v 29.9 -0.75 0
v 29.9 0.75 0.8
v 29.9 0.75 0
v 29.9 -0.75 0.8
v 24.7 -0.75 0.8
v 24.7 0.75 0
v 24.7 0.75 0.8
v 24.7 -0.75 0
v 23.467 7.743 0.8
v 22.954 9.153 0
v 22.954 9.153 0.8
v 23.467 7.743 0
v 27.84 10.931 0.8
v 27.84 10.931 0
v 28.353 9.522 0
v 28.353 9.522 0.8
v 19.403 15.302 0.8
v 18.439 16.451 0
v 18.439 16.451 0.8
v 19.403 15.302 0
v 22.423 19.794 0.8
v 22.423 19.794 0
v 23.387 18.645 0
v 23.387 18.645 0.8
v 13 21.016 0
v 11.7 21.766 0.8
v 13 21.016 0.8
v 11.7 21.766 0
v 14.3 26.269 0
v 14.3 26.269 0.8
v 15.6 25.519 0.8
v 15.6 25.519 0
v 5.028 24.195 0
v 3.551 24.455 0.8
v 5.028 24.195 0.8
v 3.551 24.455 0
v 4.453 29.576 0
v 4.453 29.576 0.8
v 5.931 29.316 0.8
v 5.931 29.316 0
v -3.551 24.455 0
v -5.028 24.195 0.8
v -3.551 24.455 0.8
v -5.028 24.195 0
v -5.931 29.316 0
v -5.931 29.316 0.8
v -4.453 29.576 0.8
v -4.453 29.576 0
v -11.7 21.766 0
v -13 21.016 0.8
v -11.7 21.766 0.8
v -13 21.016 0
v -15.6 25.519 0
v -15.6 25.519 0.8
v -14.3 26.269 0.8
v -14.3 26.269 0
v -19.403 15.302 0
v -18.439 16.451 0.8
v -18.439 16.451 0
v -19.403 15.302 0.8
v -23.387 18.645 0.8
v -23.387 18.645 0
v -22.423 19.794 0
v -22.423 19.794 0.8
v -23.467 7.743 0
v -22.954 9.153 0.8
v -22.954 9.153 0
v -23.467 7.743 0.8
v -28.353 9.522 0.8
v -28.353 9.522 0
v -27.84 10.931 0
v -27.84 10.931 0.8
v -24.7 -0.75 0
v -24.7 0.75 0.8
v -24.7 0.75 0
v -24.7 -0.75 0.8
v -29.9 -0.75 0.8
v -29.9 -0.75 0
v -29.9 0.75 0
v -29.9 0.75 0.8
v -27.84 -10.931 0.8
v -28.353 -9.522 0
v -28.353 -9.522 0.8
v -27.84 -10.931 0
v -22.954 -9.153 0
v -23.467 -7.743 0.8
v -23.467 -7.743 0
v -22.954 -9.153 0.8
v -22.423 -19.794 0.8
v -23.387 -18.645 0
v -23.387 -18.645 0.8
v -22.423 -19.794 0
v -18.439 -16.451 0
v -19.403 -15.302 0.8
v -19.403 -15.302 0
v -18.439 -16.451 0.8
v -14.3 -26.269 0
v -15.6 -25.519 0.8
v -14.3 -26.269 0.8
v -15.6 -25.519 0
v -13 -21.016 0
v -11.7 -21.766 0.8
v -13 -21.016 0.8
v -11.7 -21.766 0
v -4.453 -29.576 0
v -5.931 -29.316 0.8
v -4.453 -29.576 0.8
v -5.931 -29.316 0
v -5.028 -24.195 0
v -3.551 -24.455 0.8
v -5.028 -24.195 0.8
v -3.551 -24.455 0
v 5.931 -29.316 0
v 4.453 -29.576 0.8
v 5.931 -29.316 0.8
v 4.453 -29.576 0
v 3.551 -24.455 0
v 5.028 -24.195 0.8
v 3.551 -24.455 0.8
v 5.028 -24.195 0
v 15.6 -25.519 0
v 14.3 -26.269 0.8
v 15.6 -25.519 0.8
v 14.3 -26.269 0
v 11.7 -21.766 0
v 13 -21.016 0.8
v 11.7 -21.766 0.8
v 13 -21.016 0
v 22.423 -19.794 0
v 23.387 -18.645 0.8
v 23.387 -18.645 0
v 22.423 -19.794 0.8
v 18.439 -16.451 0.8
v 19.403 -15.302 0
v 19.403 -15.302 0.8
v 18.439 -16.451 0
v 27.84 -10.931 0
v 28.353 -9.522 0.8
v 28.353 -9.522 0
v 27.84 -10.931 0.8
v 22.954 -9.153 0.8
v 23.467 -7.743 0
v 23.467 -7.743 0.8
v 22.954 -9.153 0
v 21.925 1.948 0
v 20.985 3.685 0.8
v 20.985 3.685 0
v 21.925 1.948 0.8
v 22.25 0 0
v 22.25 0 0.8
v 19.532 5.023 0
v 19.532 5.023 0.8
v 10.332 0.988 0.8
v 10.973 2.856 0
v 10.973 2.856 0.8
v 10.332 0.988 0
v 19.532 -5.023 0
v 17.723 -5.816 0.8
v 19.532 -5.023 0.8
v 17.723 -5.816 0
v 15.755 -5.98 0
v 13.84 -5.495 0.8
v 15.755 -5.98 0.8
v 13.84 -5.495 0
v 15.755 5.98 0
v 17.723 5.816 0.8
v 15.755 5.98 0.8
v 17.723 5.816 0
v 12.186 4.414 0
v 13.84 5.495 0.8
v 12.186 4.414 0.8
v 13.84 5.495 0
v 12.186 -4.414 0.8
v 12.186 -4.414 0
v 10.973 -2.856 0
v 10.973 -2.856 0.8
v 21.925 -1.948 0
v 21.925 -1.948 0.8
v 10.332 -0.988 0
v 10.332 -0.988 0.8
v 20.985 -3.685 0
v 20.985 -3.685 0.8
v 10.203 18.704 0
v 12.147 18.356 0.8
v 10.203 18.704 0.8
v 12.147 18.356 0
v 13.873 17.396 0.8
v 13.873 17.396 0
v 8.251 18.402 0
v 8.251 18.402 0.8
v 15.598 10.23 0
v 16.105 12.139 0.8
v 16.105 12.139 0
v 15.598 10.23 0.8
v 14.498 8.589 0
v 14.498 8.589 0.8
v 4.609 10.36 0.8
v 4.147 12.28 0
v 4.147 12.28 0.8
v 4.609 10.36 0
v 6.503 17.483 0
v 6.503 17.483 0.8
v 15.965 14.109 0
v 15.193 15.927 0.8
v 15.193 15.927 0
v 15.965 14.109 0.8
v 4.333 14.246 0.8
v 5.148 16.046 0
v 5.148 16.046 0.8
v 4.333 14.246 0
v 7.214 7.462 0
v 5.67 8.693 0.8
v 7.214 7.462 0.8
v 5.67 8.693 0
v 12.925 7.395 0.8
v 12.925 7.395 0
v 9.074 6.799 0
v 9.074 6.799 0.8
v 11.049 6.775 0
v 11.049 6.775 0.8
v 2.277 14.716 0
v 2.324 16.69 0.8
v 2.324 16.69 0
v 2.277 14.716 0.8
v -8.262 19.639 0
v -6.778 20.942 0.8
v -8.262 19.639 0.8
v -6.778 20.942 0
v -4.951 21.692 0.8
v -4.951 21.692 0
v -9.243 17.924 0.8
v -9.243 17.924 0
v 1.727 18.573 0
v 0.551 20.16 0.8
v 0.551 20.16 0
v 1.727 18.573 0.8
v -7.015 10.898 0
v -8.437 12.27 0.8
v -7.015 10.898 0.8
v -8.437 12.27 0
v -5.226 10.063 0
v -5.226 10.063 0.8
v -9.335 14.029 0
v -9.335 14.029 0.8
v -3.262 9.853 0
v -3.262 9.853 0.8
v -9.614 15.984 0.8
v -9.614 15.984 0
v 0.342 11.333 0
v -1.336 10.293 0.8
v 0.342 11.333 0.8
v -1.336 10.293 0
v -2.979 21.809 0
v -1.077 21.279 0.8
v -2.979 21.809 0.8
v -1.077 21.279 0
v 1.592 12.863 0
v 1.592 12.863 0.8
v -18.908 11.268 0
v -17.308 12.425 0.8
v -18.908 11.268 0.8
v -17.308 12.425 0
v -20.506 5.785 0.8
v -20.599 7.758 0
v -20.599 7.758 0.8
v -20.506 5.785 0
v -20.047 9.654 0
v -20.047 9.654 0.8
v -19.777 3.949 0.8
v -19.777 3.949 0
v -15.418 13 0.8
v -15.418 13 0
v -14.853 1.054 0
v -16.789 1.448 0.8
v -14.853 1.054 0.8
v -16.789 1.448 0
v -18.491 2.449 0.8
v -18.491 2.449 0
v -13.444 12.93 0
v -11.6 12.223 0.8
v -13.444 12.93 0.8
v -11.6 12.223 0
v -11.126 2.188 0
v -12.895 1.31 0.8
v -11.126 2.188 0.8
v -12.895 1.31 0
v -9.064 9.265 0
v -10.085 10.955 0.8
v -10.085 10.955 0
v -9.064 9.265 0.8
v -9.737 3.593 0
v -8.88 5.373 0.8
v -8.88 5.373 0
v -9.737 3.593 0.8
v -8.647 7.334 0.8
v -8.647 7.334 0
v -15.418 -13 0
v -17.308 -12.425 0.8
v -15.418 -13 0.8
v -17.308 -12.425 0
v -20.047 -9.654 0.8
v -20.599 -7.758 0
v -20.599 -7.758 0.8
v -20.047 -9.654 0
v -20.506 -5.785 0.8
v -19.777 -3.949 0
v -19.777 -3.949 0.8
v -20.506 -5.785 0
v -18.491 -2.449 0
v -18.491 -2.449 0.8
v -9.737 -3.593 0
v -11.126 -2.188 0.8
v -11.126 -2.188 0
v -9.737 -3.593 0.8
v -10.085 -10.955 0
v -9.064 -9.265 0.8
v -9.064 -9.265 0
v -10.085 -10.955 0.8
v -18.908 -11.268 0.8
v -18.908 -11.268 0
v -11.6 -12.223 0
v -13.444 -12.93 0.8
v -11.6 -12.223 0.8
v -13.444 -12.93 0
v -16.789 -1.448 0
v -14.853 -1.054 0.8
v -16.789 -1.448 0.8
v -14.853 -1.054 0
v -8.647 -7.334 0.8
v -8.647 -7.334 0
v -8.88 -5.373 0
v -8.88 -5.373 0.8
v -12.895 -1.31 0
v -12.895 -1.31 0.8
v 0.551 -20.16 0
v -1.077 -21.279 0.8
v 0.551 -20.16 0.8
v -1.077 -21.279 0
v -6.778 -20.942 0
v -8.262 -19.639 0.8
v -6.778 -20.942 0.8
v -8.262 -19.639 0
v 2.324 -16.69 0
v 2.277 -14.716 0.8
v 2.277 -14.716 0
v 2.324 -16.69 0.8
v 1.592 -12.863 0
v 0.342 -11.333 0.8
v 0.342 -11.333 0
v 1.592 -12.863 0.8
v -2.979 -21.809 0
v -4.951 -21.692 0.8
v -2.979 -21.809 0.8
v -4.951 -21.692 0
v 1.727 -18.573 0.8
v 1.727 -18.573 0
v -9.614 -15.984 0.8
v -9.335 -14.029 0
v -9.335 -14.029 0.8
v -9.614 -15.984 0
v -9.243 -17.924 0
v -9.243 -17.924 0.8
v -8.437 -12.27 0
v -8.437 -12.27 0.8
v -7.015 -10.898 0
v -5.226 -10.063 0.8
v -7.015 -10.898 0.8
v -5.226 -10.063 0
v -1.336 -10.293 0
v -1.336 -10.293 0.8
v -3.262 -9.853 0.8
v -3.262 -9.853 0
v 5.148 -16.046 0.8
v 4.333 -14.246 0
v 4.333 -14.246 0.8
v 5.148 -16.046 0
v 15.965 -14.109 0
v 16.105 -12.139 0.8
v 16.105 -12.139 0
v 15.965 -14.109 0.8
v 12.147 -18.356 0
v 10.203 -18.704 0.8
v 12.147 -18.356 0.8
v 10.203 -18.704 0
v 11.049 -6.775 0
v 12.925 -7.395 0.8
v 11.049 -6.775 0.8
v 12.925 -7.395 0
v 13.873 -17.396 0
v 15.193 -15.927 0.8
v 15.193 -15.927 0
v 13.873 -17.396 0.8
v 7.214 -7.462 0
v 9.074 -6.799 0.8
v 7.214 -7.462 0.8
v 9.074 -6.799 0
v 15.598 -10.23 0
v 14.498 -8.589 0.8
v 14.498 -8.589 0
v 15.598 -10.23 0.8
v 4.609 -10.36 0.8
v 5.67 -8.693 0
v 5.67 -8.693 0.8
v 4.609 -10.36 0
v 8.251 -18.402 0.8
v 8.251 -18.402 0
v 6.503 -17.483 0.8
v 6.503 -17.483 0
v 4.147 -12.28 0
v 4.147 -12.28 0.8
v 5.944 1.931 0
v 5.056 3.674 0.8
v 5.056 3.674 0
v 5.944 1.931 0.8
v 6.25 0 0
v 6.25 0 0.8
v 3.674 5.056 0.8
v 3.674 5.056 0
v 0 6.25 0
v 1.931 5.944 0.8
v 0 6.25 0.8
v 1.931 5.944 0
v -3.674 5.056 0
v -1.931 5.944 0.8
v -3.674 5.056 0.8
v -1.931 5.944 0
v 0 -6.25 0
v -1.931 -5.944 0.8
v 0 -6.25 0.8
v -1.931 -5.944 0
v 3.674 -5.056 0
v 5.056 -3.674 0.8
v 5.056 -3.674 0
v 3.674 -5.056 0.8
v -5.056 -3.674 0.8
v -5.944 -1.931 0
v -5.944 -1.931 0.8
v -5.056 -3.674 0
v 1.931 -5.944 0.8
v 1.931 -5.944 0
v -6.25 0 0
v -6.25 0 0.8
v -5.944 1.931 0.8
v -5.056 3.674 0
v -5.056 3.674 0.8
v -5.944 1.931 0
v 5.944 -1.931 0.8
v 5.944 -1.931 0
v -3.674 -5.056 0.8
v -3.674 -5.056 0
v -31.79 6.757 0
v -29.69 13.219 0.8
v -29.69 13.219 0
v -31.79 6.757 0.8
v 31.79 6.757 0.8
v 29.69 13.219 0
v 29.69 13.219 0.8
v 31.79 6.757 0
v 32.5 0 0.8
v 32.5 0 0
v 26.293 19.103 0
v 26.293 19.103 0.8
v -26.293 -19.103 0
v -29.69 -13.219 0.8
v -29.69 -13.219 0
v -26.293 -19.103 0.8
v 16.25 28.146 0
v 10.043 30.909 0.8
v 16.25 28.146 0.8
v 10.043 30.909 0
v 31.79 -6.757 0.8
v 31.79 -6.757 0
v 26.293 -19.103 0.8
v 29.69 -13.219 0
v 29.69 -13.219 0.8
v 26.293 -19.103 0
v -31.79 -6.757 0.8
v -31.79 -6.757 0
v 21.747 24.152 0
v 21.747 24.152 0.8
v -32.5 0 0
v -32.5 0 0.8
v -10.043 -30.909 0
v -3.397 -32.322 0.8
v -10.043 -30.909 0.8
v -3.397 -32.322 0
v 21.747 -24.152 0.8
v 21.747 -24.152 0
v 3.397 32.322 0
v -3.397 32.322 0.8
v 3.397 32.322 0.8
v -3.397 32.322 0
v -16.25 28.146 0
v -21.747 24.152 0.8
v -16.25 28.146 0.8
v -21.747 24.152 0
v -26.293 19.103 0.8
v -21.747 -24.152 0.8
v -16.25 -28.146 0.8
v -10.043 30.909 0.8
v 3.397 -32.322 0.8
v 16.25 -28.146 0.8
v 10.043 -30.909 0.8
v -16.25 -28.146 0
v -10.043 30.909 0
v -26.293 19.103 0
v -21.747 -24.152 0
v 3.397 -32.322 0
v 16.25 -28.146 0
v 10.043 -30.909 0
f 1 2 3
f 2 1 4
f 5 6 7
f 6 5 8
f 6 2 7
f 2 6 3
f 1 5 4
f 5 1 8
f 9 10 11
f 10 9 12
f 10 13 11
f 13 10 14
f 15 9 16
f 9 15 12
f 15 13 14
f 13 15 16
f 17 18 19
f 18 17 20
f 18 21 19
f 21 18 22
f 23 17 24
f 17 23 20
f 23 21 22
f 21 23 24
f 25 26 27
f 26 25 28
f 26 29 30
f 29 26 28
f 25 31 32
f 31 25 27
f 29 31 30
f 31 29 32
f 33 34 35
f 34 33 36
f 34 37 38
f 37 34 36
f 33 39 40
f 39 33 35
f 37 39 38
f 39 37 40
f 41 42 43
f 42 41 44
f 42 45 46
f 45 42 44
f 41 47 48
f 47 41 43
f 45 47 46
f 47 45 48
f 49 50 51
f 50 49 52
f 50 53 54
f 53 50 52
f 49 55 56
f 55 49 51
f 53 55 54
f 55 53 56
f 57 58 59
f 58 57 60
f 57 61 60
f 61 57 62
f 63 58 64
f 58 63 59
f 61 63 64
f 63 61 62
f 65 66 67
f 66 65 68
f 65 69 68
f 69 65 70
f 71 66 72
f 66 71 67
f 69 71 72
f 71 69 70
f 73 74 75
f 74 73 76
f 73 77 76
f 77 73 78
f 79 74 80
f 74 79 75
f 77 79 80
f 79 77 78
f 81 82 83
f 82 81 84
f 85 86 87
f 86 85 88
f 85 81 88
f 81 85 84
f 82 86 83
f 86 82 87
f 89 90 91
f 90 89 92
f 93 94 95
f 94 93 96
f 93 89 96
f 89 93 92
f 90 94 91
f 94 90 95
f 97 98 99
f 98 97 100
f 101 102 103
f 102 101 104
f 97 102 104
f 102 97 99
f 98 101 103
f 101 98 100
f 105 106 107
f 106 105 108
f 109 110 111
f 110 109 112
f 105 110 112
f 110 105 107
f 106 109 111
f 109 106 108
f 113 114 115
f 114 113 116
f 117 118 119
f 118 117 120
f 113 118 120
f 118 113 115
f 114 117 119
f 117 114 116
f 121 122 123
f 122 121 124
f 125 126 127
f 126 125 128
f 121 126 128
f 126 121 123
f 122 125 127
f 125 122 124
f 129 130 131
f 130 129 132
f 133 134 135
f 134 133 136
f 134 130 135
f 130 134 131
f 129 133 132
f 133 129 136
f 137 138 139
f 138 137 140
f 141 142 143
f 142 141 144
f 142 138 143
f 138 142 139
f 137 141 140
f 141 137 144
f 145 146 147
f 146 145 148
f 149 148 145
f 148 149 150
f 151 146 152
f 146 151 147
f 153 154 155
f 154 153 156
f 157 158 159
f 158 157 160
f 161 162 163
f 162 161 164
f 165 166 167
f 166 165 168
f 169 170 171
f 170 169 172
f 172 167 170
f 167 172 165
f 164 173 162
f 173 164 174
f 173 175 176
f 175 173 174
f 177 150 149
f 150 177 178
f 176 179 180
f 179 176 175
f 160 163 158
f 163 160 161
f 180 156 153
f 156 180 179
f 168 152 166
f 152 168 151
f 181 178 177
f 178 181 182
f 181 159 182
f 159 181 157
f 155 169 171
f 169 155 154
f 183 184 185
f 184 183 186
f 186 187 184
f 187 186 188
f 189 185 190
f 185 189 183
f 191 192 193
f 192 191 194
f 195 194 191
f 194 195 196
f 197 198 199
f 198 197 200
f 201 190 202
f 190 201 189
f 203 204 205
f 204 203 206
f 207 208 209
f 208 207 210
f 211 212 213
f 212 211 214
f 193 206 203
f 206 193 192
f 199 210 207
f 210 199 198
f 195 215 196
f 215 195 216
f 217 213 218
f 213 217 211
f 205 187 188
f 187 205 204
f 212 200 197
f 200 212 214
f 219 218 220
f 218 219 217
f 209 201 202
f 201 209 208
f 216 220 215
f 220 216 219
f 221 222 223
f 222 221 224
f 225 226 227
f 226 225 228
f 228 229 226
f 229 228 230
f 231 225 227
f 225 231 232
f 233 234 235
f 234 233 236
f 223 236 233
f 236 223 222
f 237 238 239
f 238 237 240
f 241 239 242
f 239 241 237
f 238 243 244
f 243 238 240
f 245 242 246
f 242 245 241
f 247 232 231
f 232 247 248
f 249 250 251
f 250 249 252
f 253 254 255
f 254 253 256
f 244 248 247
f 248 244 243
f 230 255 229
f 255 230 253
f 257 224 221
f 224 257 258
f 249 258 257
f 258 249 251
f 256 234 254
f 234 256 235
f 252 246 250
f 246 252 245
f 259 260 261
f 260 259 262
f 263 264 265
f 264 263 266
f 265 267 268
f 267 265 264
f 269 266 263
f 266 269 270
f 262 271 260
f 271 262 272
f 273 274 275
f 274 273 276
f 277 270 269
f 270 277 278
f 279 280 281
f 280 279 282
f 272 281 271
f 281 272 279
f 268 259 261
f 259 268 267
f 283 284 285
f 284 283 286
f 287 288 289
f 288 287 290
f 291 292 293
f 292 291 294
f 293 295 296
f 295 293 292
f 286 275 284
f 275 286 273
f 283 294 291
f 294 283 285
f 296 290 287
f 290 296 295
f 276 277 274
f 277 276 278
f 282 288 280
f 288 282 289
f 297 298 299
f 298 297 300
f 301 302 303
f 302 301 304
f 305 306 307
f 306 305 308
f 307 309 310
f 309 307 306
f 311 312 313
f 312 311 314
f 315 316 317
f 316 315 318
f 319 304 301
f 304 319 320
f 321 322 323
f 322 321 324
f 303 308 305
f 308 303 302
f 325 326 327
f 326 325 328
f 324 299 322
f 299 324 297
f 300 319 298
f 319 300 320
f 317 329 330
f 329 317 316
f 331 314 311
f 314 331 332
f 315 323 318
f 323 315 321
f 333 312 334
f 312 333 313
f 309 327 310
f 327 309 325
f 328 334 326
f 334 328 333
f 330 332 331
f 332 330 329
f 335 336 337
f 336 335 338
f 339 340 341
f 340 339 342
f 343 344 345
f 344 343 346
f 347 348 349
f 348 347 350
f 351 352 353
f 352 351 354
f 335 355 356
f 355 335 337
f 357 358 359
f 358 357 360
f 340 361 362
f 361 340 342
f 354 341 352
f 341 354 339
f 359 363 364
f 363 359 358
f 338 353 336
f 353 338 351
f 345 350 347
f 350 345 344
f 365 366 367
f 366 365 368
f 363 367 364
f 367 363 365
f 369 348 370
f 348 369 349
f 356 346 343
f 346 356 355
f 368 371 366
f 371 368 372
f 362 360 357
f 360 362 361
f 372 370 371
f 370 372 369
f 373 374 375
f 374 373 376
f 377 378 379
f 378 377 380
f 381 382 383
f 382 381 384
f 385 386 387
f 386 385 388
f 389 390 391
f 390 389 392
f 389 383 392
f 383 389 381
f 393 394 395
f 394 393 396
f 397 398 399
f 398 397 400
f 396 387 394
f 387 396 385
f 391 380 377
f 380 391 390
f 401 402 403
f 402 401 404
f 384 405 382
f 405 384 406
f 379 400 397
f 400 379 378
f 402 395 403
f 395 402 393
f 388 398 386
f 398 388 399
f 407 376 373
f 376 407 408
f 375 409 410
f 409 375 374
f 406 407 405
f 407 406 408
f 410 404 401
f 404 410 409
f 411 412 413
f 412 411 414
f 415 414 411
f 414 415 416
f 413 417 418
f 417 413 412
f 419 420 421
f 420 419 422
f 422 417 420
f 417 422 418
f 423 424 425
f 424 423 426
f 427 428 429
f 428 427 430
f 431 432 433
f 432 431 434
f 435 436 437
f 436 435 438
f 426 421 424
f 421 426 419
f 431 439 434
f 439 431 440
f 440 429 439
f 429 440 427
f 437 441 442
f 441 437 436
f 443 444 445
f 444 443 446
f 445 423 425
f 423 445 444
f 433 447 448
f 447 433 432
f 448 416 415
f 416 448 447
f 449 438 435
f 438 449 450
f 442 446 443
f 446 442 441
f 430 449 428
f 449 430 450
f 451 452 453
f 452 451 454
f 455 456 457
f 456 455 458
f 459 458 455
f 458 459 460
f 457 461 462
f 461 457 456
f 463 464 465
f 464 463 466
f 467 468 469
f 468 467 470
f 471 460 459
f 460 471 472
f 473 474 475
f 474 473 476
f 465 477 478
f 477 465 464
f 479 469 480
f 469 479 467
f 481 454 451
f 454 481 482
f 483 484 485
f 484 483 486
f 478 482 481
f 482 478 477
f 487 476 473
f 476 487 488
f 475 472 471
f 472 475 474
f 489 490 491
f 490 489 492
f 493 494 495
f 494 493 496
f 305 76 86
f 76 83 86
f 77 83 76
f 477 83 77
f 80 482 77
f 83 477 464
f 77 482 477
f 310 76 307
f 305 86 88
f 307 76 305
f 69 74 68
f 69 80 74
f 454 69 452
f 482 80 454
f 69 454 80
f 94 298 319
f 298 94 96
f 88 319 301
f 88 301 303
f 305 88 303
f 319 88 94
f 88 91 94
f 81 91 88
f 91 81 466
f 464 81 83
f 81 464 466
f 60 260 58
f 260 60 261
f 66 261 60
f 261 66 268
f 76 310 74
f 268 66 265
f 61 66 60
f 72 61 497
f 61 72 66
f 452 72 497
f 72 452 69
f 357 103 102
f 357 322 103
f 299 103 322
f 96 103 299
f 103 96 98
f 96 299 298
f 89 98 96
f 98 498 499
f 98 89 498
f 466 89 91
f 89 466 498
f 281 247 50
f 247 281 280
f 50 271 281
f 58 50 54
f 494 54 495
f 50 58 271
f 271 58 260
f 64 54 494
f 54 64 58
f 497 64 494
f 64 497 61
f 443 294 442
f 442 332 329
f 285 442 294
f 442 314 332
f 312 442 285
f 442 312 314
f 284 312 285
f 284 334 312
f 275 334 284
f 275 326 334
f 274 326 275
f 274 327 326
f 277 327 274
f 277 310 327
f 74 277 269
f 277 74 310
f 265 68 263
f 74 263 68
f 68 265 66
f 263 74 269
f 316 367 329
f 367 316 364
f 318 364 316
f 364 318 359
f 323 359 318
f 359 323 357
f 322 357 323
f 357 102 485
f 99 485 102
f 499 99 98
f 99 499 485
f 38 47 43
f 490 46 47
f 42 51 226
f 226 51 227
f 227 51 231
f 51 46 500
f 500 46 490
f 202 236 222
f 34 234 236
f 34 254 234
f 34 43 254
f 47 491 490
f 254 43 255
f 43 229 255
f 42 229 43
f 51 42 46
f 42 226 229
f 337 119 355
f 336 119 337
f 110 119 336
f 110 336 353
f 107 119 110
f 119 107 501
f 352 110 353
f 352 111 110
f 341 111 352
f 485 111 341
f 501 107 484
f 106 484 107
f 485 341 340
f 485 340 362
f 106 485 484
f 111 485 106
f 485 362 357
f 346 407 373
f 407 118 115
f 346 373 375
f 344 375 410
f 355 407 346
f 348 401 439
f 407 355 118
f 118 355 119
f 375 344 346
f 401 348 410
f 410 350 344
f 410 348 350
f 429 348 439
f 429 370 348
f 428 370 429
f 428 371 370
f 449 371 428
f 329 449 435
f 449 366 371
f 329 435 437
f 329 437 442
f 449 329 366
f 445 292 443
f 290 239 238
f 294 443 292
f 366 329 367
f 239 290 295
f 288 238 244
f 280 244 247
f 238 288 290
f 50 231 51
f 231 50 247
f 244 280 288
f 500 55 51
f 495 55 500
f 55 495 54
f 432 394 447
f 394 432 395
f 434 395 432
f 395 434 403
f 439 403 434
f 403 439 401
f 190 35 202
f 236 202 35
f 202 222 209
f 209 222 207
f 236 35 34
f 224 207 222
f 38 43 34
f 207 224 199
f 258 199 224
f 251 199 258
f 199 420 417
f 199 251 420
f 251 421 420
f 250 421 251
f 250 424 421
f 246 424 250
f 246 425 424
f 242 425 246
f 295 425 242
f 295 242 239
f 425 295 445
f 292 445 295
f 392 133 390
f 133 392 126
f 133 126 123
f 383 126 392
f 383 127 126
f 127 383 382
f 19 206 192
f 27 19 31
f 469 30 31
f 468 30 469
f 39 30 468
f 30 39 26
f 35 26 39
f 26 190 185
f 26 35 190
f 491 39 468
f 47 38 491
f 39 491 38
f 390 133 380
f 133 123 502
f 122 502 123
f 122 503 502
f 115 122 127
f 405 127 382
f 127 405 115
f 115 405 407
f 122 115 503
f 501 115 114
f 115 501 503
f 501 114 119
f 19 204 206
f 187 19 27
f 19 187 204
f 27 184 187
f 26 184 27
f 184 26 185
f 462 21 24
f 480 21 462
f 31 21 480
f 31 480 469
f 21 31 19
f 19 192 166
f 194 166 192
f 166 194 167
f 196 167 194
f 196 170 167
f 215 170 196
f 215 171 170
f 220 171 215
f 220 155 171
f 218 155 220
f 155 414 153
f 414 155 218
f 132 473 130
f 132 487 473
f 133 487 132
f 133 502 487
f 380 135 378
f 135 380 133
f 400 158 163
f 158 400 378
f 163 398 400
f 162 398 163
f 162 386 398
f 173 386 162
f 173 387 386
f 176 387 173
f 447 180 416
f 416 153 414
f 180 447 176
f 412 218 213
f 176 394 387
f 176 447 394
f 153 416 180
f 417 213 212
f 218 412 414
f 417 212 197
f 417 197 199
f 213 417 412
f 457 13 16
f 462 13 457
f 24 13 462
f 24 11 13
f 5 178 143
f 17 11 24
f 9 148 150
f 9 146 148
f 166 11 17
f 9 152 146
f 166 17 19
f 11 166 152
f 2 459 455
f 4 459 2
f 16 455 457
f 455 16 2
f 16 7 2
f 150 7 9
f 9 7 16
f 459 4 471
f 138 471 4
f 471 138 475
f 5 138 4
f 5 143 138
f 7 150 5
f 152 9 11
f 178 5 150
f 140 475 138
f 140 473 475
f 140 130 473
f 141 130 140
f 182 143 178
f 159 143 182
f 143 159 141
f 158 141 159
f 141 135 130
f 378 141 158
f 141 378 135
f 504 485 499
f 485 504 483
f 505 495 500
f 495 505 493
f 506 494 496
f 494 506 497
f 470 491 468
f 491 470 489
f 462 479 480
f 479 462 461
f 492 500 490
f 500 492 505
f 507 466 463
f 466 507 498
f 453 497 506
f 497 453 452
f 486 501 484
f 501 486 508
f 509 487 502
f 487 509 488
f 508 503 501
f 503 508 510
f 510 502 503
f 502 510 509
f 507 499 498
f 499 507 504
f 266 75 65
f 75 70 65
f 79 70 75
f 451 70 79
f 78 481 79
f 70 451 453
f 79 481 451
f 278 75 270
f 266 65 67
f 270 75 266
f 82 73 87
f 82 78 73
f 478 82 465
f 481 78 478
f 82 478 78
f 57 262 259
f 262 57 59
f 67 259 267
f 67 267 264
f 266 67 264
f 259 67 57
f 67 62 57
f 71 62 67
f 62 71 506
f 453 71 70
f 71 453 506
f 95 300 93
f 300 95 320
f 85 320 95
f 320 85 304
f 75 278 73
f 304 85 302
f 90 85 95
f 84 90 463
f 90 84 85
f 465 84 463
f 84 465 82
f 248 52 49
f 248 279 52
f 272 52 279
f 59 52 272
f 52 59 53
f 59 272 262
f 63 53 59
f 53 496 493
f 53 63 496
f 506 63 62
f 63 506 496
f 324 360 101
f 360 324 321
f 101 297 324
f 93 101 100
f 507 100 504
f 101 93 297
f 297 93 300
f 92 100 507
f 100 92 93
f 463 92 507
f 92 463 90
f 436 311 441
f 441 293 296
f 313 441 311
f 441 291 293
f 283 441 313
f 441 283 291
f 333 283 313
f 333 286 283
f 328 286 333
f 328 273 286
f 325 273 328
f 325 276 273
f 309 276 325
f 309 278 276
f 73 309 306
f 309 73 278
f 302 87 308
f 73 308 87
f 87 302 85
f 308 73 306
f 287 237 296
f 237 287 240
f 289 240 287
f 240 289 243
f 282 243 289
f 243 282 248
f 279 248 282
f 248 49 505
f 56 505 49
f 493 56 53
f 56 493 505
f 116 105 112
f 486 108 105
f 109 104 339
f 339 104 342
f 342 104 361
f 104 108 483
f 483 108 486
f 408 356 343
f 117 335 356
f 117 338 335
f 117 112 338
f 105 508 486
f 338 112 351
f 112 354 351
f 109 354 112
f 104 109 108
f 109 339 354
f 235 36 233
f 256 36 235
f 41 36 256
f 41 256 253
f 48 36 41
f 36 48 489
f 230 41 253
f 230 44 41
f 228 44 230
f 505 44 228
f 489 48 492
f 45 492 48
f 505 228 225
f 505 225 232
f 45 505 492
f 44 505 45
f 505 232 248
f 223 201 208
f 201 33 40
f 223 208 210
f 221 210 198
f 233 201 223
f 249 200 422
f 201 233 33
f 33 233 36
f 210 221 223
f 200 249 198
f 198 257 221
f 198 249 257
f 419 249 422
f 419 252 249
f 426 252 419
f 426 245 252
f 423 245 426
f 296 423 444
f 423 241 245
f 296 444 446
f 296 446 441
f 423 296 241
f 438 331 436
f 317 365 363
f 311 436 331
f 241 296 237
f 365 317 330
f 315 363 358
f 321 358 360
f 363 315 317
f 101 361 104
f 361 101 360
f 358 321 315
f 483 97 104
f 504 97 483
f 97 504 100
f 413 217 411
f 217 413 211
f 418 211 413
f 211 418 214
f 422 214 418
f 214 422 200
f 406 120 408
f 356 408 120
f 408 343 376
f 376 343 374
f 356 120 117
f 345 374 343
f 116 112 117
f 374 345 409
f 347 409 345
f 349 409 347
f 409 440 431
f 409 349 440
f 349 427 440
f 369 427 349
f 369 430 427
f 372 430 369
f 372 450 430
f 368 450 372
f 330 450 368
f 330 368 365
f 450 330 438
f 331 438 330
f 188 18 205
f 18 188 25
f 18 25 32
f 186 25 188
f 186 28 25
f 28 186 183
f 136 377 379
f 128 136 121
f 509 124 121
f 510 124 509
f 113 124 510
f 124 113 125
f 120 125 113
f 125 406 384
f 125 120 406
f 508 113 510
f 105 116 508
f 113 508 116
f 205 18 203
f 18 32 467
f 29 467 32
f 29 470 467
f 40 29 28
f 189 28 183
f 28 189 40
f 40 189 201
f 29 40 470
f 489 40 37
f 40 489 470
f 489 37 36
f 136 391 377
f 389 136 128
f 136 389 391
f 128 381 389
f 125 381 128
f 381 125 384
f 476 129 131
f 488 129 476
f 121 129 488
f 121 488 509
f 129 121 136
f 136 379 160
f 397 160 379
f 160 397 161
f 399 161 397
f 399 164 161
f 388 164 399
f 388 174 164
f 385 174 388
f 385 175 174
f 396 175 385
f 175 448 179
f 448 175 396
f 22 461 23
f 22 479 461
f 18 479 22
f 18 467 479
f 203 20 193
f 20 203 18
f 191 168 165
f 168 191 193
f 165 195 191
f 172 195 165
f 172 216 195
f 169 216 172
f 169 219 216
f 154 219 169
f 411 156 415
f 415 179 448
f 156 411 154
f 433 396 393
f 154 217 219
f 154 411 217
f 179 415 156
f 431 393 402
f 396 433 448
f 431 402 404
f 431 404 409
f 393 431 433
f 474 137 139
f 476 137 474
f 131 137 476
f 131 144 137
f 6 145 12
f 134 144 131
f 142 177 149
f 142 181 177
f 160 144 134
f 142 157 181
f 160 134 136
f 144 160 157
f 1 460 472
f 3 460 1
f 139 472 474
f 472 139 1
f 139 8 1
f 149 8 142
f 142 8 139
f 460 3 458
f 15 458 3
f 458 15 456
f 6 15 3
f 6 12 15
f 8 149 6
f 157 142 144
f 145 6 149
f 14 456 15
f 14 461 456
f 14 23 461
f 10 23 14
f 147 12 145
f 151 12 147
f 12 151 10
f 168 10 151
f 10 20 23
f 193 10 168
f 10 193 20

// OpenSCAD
module encoder_wheel(D, d, h=1.5, nb=25, L=5, l=2, nh=7, slim=false) 
{
    difference() {
        
        cylinder(r=D/2, h=h);

        for (i = [ 0 : nb ]) {
            rotate([0, 0, i*360/nb])
            translate([ D/2-L, 0, 0])
            cube([ L, l, 3*h], , center=true);
        }
        
        // thiner core
        if (slim) {
            translate([ 0, 0, h/2])
            cylinder(r=D/2-2*L, h=h);
        }
        
        union() {
            
            // central hole
            cylinder(r=d/2, h=3*h, center=true);
        
            for (k = [ 0 : nh]) {
                rotate([0, 0, k*360/nh])
                translate([ D/4, 0, 0])
                cylinder(r=6, h=10, center=true);
            }
        }
    }
}

module draw_encoder()
{
    // spindle is 12mm with 17mm shoulder
    // chuck is 48mm diameter 
    D = 65;
    d = 12.5;
    h = 0.8;
    // holes
    nb = 18;
    L = 5.2;
    l = 1.5;

    encoder_wheel(D, d, h, nb, L, l);
}

draw_encoder();
